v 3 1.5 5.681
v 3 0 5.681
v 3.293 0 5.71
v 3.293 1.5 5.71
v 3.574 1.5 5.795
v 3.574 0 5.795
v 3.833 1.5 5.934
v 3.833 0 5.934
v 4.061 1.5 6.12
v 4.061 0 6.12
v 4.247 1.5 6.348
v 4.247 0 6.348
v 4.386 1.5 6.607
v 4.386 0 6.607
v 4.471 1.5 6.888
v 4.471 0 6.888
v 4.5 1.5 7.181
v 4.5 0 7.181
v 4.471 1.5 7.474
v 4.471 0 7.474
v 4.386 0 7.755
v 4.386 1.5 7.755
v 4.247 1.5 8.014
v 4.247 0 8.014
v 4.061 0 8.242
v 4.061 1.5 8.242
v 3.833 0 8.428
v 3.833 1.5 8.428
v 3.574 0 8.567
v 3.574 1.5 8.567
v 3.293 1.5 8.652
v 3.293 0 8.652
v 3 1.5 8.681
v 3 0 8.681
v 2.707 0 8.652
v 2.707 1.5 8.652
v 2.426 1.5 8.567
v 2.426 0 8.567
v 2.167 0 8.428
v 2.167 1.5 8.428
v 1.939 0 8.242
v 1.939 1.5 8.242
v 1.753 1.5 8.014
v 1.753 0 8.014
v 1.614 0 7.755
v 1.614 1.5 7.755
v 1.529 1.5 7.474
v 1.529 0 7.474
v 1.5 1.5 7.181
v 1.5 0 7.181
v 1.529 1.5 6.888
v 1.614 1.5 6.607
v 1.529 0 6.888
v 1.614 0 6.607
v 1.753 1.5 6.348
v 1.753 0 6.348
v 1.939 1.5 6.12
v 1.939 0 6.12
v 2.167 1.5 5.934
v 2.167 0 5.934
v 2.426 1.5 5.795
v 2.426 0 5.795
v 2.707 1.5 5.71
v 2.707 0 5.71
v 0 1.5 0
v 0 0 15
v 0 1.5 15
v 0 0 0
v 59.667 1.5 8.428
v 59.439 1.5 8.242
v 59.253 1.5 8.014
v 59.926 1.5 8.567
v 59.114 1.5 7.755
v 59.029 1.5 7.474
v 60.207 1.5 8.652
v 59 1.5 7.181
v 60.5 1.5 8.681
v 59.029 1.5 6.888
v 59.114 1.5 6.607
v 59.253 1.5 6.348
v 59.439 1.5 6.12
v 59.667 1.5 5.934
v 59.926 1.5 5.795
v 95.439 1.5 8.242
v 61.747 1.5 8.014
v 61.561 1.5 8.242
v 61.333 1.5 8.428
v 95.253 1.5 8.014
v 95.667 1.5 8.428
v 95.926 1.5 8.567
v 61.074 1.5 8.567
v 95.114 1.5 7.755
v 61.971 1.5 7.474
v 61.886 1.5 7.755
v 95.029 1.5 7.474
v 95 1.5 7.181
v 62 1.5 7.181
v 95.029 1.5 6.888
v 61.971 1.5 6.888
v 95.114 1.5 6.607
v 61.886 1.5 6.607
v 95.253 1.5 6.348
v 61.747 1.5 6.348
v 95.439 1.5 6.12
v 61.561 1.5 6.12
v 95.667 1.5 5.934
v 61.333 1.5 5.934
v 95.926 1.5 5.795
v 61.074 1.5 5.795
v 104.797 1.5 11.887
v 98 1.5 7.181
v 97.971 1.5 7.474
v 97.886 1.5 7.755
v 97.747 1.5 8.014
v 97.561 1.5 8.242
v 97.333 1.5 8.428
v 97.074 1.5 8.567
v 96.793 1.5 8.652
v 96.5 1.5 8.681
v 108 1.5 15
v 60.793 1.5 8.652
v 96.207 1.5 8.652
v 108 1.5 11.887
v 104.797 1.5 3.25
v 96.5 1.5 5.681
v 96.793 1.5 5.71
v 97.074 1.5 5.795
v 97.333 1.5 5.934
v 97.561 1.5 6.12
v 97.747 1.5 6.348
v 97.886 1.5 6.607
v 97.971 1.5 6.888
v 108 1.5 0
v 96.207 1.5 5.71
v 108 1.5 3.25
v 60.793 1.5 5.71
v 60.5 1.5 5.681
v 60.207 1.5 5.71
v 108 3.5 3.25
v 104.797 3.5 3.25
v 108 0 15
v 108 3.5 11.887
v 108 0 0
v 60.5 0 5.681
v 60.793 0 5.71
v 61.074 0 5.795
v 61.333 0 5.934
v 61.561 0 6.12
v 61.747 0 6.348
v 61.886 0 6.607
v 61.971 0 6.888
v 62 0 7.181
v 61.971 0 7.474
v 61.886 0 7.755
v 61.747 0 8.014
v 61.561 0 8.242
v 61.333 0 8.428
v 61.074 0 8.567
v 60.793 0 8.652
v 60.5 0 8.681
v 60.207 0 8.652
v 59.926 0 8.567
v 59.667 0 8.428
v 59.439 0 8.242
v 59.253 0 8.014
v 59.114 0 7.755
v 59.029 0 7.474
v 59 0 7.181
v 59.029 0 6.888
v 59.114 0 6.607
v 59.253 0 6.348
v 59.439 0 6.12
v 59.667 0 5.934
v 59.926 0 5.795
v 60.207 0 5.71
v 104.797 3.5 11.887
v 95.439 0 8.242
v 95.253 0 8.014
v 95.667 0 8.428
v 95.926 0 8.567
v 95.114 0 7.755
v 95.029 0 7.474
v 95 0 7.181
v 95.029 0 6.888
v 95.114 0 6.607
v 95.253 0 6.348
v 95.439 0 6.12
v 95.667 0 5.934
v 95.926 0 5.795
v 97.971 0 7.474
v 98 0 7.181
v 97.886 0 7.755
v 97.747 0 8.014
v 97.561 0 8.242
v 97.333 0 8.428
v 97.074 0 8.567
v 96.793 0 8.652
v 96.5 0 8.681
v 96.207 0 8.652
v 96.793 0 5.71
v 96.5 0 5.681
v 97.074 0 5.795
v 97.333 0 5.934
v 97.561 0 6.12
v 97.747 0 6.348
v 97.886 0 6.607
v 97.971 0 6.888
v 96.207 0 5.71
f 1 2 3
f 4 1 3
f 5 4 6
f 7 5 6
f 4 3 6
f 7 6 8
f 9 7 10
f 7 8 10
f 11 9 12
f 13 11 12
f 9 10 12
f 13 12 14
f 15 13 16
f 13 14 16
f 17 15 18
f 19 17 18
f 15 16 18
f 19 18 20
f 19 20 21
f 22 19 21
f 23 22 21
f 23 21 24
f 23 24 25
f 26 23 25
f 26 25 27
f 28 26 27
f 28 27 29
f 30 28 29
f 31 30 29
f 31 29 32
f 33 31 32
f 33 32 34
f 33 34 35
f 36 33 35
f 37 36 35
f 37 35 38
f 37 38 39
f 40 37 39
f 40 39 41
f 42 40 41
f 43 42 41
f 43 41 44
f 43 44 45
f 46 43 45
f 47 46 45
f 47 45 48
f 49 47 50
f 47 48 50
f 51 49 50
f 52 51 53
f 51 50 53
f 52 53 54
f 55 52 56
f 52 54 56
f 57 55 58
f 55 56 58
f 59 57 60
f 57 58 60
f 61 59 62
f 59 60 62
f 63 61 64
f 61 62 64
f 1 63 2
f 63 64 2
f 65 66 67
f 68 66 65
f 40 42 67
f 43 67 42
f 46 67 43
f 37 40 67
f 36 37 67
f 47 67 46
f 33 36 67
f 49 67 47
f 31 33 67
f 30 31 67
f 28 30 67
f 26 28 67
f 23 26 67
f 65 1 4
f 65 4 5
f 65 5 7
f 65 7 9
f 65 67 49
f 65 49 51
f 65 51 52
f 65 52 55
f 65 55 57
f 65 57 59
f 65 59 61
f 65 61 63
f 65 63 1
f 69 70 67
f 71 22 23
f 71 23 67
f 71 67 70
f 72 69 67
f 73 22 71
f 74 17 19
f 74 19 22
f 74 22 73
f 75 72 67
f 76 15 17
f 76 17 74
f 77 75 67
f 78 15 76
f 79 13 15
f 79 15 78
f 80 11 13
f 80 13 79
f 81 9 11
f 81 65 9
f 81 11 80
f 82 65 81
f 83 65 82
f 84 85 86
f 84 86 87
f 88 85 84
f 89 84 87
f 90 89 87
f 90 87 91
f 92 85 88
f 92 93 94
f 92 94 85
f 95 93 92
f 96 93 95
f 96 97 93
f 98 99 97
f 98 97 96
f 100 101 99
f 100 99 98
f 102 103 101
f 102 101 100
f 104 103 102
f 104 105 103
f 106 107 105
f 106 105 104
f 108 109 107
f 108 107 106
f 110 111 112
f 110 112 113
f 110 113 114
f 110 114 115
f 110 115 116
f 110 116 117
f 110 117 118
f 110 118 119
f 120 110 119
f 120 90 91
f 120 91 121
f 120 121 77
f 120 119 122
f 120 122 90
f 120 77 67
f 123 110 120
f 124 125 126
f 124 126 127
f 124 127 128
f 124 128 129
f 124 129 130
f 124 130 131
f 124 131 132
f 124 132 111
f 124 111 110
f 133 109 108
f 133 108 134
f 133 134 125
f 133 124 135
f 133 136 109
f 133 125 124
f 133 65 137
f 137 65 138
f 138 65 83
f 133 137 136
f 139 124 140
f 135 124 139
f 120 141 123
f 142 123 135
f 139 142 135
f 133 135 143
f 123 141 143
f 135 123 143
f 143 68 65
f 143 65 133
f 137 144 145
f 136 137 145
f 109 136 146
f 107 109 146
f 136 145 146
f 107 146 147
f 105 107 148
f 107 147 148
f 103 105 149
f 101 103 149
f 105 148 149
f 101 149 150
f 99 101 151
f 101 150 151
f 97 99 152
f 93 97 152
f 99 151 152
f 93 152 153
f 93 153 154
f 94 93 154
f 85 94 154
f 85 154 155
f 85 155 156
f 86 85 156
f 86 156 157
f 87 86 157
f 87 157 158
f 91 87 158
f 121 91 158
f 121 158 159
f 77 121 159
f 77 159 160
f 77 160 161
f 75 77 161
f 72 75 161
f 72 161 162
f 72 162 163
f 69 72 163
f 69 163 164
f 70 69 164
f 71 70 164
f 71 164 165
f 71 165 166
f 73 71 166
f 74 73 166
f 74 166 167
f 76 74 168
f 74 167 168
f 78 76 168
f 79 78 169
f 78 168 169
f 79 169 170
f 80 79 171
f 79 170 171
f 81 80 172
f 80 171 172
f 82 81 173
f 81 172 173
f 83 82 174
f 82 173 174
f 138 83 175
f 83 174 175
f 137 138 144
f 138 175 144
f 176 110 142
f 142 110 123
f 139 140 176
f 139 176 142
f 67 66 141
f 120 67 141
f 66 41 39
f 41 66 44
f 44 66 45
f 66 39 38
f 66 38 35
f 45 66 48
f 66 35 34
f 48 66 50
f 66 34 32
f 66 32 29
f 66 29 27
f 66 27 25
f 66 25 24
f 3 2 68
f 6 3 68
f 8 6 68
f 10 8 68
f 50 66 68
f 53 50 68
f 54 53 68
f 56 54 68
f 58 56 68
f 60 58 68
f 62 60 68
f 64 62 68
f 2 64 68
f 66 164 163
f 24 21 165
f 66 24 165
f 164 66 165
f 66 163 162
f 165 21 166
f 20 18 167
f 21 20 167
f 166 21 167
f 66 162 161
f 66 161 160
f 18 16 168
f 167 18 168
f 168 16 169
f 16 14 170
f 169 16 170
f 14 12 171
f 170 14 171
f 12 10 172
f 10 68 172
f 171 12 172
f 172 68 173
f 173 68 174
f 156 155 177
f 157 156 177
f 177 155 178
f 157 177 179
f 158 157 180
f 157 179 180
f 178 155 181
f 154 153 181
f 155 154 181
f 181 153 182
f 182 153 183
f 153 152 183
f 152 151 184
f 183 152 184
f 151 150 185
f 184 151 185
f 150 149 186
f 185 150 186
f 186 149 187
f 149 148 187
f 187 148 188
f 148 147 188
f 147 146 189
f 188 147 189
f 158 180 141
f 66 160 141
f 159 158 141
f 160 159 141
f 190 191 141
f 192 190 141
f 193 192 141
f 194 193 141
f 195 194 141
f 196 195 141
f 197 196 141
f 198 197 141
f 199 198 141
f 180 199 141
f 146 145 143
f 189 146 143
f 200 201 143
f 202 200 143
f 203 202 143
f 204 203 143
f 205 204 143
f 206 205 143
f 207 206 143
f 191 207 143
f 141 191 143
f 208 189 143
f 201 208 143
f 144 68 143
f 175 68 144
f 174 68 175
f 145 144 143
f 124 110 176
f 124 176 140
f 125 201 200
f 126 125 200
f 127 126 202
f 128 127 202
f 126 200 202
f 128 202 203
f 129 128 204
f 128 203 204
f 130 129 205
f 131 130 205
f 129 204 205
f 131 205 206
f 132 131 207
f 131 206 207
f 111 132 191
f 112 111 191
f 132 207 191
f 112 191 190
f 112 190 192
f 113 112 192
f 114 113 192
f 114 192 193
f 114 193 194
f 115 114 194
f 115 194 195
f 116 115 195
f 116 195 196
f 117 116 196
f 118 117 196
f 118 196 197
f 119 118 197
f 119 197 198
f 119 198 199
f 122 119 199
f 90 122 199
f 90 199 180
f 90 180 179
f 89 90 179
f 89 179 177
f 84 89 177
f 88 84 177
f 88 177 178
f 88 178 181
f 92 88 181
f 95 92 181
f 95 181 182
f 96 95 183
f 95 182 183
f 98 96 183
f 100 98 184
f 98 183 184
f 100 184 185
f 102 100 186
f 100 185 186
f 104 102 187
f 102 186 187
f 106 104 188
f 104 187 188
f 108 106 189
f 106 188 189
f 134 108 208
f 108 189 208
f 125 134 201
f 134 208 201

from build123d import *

# Parameters (mm, degrees)
SKETCH1_W           = 108
SKETCH1_H           = 15
BOSS_EXTRUDE1_DEPTH = 1.5
SKETCH2_W           = 3.202930222
SKETCH2_H           = 8.636913893
BOSS_EXTRUDE2_DEPTH = 2
SKETCH3_R           = 1.5
CUT_EXTRUDE1_DEPTH  = 2


with BuildPart() as part:
    # Sketch1 → Boss-Extrude1 (new body)
    with BuildSketch(Plane(origin=(0, 0, 0), x_dir=(1, 0, 0), z_dir=(0, 1, 0))):
        with Locations((54, -7.5)):
            Rectangle(SKETCH1_W, SKETCH1_H)
    extrude(amount=BOSS_EXTRUDE1_DEPTH)

    # Sketch2 → Boss-Extrude2 (add)
    with BuildSketch(Plane(origin=(0, 1.5, 0), x_dir=(1, 0, 0), z_dir=(0, 1, 0))):
        with Locations((106.398534889, -7.568326669)):
            Rectangle(SKETCH2_W, SKETCH2_H)
    extrude(amount=BOSS_EXTRUDE2_DEPTH)

    # Sketch3 → Cut-Extrude1 (cut)
    with BuildSketch(Plane(origin=(0, 0, 0), x_dir=(-1, 0, 0), z_dir=(0, -1, 0))):
        with Locations(Location((-3, -7.180959686, 0), (0, 0, 90))):
            Circle(SKETCH3_R)
        with Locations(Location((-60.5, -7.180959686, 0), (0, 0, 90))):
            Circle(SKETCH3_R)
        with Locations(Location((-96.5, -7.180959686, 0), (0, 0, 90))):
            Circle(SKETCH3_R)
    extrude(amount=-CUT_EXTRUDE1_DEPTH, mode=Mode.SUBTRACT)


solid = part.part
